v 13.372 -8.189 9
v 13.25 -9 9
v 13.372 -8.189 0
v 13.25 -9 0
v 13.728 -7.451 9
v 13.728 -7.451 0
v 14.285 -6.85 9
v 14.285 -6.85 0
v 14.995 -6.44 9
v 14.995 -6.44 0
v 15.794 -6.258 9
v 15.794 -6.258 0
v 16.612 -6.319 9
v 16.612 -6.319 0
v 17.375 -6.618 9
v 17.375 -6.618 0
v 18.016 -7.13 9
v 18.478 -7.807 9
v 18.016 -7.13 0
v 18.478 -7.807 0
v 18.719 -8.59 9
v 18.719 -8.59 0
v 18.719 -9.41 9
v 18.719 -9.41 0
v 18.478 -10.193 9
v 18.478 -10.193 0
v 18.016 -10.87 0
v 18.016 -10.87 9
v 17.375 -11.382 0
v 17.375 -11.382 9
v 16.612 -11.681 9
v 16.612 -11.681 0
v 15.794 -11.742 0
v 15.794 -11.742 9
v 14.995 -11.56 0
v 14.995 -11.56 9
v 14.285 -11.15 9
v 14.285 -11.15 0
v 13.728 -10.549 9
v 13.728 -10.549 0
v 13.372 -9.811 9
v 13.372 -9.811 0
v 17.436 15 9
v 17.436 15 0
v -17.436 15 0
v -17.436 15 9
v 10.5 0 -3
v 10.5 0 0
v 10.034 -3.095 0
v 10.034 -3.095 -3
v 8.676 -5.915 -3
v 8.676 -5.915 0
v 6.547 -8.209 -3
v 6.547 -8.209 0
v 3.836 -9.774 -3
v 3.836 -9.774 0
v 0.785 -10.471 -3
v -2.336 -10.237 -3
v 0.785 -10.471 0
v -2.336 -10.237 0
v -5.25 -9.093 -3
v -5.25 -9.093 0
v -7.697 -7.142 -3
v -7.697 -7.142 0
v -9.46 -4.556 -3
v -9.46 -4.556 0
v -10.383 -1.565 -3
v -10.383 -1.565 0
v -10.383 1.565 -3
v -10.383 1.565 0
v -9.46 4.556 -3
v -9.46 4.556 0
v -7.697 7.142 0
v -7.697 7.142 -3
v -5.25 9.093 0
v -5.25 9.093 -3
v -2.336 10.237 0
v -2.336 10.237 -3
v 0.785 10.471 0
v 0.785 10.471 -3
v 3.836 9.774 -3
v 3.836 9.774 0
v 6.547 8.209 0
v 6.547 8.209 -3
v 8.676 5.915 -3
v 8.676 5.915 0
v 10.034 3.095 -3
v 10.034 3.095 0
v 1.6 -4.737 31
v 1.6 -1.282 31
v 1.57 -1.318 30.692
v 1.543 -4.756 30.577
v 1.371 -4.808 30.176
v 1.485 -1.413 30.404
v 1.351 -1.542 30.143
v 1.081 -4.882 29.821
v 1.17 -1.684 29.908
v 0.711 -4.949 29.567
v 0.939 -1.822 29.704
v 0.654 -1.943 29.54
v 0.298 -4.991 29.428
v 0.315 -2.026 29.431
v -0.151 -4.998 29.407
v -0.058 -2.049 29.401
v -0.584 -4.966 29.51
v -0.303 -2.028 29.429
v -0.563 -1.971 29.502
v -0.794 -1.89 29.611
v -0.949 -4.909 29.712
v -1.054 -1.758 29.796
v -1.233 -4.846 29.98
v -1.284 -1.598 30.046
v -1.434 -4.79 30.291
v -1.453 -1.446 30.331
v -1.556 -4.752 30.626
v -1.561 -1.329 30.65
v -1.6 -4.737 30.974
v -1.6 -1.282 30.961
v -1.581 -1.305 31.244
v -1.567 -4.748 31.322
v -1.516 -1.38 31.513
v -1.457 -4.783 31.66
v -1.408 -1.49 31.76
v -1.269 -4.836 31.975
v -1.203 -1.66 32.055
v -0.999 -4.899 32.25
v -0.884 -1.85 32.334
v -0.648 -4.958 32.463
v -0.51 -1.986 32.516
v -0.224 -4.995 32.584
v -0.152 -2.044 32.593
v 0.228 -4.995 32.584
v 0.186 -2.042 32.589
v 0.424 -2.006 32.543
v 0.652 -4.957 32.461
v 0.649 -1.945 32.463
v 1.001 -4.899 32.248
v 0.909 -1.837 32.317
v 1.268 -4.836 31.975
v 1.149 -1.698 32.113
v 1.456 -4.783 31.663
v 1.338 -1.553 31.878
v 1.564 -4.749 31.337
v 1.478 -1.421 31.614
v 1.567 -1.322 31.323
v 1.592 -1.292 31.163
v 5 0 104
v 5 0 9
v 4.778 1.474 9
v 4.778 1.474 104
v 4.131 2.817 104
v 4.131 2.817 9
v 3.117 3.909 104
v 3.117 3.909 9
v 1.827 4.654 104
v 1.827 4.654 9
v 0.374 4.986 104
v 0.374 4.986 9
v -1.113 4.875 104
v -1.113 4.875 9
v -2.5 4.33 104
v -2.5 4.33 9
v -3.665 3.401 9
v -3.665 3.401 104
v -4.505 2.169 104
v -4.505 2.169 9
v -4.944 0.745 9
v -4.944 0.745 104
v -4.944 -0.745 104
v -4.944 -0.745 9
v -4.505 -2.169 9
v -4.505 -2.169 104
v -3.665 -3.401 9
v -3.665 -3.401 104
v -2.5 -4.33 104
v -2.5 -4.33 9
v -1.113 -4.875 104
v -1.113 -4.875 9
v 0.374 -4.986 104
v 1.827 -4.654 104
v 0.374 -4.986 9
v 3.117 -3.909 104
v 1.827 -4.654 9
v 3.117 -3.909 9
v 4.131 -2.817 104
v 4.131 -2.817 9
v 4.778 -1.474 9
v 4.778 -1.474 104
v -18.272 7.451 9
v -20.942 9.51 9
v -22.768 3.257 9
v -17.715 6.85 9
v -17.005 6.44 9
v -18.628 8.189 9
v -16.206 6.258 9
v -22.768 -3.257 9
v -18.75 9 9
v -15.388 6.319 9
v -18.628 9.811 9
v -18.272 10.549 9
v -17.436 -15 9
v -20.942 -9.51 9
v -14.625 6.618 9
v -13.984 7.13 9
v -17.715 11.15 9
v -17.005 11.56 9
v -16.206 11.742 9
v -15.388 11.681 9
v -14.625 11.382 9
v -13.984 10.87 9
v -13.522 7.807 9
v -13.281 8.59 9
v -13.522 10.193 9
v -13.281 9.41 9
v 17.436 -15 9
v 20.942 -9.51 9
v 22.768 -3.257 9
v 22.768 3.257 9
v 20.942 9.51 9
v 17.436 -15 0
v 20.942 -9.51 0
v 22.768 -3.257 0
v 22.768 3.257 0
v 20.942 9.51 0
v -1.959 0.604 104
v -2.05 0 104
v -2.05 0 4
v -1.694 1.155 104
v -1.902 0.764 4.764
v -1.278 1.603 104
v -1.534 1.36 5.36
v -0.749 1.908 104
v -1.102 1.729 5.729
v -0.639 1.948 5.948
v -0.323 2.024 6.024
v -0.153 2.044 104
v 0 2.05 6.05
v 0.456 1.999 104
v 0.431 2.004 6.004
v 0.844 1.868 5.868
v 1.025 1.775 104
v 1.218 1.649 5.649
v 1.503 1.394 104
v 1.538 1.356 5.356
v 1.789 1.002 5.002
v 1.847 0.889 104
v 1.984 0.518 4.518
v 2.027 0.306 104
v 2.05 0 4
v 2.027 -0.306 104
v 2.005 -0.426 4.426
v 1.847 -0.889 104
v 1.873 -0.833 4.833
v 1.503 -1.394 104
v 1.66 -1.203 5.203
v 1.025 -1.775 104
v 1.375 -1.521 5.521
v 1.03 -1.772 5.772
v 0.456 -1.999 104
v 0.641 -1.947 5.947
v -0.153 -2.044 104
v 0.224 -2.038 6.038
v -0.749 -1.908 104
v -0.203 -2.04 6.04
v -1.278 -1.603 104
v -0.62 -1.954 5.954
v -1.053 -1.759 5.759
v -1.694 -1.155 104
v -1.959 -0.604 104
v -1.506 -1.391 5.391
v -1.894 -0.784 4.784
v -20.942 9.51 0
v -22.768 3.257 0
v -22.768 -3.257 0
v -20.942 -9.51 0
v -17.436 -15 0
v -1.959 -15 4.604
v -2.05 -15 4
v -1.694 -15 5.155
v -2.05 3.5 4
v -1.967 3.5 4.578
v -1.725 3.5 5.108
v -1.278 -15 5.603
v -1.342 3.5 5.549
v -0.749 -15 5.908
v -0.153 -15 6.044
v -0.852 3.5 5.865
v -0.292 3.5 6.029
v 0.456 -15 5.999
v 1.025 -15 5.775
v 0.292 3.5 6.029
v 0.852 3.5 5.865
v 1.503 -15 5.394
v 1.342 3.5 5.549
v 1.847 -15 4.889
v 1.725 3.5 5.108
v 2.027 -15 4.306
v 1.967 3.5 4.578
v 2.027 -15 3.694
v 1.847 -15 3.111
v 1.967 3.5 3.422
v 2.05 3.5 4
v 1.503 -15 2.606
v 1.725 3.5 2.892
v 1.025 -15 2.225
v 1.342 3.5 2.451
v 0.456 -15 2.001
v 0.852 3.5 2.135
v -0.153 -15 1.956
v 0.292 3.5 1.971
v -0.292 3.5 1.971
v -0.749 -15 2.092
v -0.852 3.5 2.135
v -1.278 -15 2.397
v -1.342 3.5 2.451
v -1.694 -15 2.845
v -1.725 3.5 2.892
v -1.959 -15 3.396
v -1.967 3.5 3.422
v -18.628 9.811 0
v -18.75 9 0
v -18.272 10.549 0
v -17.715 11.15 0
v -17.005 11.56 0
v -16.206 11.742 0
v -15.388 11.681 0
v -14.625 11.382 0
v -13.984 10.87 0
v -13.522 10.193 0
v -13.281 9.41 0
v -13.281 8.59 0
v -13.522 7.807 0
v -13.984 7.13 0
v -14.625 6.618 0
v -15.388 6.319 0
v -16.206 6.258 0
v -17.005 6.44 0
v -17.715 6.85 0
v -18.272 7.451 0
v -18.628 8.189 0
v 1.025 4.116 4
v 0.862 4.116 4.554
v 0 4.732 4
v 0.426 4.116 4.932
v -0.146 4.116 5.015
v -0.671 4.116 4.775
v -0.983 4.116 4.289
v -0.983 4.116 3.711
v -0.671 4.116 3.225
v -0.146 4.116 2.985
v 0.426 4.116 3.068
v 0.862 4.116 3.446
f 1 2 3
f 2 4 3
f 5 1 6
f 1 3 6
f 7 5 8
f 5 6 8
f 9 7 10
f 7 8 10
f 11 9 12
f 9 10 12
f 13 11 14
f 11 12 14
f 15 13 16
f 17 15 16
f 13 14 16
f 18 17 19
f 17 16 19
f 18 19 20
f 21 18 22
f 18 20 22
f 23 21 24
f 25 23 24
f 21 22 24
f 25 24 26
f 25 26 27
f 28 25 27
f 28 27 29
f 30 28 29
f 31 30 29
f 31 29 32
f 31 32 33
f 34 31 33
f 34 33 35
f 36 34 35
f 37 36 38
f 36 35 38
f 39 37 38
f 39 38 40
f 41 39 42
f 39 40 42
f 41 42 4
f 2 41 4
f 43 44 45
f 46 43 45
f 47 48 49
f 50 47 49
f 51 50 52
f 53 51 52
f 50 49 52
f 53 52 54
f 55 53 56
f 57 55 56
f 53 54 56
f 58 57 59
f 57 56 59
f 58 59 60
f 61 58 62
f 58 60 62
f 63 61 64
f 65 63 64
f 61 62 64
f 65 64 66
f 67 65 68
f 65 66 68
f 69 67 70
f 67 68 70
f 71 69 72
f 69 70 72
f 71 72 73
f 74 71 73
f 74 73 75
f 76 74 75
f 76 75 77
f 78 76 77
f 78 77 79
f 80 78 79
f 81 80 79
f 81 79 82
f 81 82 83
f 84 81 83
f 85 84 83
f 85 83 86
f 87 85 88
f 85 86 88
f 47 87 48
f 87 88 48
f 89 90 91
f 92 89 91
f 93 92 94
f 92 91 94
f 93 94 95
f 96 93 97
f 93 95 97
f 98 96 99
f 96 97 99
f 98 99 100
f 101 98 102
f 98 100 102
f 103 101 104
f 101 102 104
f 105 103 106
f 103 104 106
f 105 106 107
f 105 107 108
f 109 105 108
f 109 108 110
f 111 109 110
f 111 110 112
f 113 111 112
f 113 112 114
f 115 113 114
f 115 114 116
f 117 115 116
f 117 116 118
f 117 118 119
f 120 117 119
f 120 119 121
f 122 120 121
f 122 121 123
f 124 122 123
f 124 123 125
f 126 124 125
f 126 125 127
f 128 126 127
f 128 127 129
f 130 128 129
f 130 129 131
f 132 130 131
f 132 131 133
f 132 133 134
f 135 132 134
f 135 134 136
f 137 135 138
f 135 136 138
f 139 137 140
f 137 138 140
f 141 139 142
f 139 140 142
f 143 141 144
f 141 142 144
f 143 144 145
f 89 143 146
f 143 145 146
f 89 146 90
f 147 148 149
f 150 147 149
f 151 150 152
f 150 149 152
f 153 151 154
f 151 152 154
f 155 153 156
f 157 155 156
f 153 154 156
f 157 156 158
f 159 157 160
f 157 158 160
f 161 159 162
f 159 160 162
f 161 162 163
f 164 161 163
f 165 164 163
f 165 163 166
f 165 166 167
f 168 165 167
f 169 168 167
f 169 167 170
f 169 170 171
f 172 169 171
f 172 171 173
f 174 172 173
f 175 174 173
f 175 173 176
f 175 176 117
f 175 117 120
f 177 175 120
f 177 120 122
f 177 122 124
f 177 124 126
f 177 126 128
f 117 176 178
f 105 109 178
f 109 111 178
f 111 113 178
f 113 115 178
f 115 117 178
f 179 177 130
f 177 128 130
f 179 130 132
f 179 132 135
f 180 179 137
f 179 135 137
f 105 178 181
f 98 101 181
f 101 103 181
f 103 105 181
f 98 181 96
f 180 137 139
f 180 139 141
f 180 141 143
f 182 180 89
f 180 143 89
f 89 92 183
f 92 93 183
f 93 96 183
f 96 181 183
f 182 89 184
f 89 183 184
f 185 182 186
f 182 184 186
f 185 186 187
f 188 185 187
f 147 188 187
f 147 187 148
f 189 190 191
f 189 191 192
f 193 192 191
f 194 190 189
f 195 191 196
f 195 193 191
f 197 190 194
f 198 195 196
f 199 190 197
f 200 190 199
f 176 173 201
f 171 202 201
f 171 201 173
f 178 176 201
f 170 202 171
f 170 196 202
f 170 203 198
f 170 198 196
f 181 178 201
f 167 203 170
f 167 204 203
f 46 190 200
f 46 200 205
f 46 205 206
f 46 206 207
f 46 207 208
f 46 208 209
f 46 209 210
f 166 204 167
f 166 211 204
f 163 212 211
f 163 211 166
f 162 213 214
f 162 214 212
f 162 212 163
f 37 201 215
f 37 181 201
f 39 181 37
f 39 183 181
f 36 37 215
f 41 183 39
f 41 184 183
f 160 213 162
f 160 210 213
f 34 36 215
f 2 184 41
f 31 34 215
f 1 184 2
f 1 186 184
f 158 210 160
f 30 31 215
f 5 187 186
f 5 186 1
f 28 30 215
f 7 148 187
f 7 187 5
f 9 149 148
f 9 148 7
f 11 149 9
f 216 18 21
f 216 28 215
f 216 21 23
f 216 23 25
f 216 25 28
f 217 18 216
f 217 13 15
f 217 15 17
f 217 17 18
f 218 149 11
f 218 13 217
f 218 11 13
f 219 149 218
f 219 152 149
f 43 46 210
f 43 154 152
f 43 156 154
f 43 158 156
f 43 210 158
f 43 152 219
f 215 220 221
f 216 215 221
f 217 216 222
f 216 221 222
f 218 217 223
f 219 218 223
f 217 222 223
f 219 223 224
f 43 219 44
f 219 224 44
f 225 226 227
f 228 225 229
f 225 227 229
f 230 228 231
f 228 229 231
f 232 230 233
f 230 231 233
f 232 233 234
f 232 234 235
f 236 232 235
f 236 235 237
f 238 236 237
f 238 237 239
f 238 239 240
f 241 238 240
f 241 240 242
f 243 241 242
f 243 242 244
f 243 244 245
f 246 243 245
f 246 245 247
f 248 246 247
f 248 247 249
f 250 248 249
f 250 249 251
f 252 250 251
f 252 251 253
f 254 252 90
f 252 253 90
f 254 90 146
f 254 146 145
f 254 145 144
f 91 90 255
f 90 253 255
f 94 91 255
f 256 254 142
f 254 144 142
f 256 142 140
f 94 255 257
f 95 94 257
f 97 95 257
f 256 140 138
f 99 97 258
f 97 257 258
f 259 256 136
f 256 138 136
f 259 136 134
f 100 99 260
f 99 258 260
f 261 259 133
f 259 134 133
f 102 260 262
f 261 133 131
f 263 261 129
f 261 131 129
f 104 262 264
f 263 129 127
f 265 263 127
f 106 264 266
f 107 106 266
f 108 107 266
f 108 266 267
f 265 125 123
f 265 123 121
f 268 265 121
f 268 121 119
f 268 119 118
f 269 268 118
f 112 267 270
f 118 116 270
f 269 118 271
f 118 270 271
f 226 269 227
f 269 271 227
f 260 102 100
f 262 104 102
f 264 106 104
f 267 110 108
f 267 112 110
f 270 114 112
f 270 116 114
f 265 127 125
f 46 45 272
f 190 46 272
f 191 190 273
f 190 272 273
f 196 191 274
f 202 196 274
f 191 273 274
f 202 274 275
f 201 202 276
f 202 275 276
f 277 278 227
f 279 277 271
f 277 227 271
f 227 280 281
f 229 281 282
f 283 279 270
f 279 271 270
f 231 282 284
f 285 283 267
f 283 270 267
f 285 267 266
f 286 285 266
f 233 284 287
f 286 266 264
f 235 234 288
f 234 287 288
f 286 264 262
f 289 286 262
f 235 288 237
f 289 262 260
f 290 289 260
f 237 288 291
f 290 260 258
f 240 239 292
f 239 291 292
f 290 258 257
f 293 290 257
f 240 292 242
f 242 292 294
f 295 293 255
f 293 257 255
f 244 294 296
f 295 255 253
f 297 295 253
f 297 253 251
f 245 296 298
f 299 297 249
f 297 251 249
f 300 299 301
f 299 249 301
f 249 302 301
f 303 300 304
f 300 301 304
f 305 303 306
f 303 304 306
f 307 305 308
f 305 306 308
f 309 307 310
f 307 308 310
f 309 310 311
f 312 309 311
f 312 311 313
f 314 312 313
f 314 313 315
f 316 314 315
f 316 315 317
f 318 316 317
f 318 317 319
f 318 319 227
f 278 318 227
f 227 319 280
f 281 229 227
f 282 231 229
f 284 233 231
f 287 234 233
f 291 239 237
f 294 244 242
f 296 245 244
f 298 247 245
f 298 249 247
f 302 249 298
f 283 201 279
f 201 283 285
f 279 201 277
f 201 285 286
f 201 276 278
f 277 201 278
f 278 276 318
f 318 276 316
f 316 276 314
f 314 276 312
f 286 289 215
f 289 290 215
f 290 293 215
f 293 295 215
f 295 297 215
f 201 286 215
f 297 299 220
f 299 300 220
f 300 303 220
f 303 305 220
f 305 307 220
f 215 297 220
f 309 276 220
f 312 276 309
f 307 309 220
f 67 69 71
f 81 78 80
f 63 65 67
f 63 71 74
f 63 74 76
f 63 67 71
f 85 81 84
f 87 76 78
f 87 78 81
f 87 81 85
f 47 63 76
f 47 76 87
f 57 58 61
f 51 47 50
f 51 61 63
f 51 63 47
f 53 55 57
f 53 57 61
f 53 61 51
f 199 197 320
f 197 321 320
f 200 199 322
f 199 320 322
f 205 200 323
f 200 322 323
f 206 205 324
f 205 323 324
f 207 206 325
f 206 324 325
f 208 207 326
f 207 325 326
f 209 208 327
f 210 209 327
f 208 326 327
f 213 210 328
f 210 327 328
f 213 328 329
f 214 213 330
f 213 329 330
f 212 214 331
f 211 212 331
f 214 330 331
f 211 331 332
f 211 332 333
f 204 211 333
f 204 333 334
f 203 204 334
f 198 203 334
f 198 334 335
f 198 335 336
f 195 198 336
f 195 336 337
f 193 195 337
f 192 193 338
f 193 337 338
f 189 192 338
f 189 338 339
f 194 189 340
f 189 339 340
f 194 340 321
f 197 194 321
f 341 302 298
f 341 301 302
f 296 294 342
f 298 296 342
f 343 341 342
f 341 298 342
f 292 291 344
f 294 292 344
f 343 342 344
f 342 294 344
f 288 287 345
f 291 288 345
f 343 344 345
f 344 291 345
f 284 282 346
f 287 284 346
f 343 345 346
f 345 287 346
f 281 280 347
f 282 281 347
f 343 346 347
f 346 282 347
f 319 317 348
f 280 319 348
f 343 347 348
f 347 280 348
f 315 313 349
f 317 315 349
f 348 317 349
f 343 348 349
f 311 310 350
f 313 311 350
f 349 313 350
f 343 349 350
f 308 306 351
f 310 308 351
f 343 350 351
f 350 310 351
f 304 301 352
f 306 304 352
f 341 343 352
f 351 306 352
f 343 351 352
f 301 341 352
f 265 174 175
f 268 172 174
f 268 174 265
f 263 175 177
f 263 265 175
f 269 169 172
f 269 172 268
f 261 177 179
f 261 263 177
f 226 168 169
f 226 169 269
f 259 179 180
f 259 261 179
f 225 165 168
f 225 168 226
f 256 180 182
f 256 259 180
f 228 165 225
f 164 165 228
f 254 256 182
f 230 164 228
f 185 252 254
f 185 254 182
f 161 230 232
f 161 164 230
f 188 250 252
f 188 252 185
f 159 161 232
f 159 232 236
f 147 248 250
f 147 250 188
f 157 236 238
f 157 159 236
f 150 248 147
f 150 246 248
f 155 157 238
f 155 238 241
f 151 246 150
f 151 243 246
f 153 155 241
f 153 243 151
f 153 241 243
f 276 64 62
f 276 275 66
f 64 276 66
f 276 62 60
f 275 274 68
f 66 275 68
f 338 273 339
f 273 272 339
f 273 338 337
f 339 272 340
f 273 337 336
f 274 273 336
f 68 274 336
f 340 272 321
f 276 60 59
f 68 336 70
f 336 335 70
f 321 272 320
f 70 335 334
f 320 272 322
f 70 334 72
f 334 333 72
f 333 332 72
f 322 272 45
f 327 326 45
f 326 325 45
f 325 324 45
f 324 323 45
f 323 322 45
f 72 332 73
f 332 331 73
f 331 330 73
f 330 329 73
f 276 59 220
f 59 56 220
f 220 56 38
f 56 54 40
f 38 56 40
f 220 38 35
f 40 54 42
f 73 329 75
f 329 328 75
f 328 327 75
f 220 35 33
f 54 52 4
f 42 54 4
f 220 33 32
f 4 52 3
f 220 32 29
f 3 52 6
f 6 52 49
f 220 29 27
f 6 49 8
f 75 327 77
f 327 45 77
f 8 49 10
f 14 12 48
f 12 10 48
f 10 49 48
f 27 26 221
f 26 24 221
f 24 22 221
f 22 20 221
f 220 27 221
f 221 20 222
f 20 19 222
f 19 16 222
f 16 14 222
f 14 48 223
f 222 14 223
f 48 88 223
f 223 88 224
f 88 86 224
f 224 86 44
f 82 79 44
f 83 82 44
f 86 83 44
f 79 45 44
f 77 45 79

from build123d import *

# Parameters (mm, degrees)
F1_DEPTH  = 9
F2_R      = 10.5
F3_DEPTH  = 3
F4_R      = 5
F5_DEPTH  = 95
F7_D      = 3.2
F7_DEPTH  = 5
F7_TIP    = 0.9613769904
F9_D      = 4.1
F9_DEPTH  = 18.5
F9_TIP    = 1.231764269
F11_D     = 4.1
F11_DEPTH = 100
F11_TIP   = 1.231764269
F13_D     = 5.5
F13_DEPTH = 9
F13_TIP   = 1.6523667023


with BuildPart() as f1:
    # F0 (on Top) → F1 (new body)
    with BuildSketch(Plane.XY):
        with BuildLine():
            Line((-17.435, 15), (-17.4355957742, 15))
            ThreePointArc((-17.4355957742, 15), (-23, 0), (-17.4355957742, -15))
            Line((-17.4355957742, -15), (-17.435, -15))
            Line((-17.435, -15), (17.435, -15))
            Line((17.435, -15), (17.4355957742, -15))
            ThreePointArc((17.4355957742, -15), (23, 0), (17.4355957742, 15))
            Line((17.4355957742, 15), (17.435, 15))
            Line((17.435, 15), (-17.435, 15))
        make_face()
    extrude(amount=F1_DEPTH)

    # F2 (on face) → F3 (join)
    with BuildSketch(Plane(origin=(0, 0, 0), x_dir=(1, 0, 0), z_dir=(0, 0, -1))):
        Circle(F2_R)
    extrude(amount=F3_DEPTH)

    # F4 (on face) → F5 (join)
    with BuildSketch(Plane.XY.offset(9)):
        Circle(F4_R)
    extrude(amount=F5_DEPTH)

    # F7 (one way)
    with BuildSketch(Plane(origin=(0, 0, 0), x_dir=(1, 0, 0), z_dir=(0, 1, 0))):
        with Locations((0, -31)):
            Circle(F7_D / 2)
    extrude(amount=-F7_DEPTH, mode=Mode.SUBTRACT)
    with Locations(Plane(origin=(0, 0, 0), x_dir=(1, 0, 0), z_dir=(0, 1, 0))):
        with Locations((0, -31)):
            with Locations((0, 0, -(F7_DEPTH + F7_TIP / 2))):  # 118° drill point
                Cone(0, F7_D / 2, F7_TIP, mode=Mode.SUBTRACT)

    # F9
    with Locations(Plane.XZ.offset(15)):
        with Locations((0, 4)):
            Hole(F9_D / 2, depth=F9_DEPTH)
            with Locations((0, 0, -(F9_DEPTH + F9_TIP / 2))):  # 118° drill point
                Cone(0, F9_D / 2, F9_TIP, mode=Mode.SUBTRACT)

    # F11
    with Locations(Plane.XY.offset(104)):
        with Locations((0, 0)):
            Hole(F11_D / 2, depth=F11_DEPTH)
            with Locations((0, 0, -(F11_DEPTH + F11_TIP / 2))):  # 118° drill point
                Cone(0, F11_D / 2, F11_TIP, mode=Mode.SUBTRACT)

    # F13
    with Locations(Plane.XY.offset(9)):
        with Locations((-16, 9), (16, -9)):
            Hole(F13_D / 2, depth=F13_DEPTH)
            with Locations((0, 0, -(F13_DEPTH + F13_TIP / 2))):  # 118° drill point
                Cone(0, F13_D / 2, F13_TIP, mode=Mode.SUBTRACT)


solid = f1.part
